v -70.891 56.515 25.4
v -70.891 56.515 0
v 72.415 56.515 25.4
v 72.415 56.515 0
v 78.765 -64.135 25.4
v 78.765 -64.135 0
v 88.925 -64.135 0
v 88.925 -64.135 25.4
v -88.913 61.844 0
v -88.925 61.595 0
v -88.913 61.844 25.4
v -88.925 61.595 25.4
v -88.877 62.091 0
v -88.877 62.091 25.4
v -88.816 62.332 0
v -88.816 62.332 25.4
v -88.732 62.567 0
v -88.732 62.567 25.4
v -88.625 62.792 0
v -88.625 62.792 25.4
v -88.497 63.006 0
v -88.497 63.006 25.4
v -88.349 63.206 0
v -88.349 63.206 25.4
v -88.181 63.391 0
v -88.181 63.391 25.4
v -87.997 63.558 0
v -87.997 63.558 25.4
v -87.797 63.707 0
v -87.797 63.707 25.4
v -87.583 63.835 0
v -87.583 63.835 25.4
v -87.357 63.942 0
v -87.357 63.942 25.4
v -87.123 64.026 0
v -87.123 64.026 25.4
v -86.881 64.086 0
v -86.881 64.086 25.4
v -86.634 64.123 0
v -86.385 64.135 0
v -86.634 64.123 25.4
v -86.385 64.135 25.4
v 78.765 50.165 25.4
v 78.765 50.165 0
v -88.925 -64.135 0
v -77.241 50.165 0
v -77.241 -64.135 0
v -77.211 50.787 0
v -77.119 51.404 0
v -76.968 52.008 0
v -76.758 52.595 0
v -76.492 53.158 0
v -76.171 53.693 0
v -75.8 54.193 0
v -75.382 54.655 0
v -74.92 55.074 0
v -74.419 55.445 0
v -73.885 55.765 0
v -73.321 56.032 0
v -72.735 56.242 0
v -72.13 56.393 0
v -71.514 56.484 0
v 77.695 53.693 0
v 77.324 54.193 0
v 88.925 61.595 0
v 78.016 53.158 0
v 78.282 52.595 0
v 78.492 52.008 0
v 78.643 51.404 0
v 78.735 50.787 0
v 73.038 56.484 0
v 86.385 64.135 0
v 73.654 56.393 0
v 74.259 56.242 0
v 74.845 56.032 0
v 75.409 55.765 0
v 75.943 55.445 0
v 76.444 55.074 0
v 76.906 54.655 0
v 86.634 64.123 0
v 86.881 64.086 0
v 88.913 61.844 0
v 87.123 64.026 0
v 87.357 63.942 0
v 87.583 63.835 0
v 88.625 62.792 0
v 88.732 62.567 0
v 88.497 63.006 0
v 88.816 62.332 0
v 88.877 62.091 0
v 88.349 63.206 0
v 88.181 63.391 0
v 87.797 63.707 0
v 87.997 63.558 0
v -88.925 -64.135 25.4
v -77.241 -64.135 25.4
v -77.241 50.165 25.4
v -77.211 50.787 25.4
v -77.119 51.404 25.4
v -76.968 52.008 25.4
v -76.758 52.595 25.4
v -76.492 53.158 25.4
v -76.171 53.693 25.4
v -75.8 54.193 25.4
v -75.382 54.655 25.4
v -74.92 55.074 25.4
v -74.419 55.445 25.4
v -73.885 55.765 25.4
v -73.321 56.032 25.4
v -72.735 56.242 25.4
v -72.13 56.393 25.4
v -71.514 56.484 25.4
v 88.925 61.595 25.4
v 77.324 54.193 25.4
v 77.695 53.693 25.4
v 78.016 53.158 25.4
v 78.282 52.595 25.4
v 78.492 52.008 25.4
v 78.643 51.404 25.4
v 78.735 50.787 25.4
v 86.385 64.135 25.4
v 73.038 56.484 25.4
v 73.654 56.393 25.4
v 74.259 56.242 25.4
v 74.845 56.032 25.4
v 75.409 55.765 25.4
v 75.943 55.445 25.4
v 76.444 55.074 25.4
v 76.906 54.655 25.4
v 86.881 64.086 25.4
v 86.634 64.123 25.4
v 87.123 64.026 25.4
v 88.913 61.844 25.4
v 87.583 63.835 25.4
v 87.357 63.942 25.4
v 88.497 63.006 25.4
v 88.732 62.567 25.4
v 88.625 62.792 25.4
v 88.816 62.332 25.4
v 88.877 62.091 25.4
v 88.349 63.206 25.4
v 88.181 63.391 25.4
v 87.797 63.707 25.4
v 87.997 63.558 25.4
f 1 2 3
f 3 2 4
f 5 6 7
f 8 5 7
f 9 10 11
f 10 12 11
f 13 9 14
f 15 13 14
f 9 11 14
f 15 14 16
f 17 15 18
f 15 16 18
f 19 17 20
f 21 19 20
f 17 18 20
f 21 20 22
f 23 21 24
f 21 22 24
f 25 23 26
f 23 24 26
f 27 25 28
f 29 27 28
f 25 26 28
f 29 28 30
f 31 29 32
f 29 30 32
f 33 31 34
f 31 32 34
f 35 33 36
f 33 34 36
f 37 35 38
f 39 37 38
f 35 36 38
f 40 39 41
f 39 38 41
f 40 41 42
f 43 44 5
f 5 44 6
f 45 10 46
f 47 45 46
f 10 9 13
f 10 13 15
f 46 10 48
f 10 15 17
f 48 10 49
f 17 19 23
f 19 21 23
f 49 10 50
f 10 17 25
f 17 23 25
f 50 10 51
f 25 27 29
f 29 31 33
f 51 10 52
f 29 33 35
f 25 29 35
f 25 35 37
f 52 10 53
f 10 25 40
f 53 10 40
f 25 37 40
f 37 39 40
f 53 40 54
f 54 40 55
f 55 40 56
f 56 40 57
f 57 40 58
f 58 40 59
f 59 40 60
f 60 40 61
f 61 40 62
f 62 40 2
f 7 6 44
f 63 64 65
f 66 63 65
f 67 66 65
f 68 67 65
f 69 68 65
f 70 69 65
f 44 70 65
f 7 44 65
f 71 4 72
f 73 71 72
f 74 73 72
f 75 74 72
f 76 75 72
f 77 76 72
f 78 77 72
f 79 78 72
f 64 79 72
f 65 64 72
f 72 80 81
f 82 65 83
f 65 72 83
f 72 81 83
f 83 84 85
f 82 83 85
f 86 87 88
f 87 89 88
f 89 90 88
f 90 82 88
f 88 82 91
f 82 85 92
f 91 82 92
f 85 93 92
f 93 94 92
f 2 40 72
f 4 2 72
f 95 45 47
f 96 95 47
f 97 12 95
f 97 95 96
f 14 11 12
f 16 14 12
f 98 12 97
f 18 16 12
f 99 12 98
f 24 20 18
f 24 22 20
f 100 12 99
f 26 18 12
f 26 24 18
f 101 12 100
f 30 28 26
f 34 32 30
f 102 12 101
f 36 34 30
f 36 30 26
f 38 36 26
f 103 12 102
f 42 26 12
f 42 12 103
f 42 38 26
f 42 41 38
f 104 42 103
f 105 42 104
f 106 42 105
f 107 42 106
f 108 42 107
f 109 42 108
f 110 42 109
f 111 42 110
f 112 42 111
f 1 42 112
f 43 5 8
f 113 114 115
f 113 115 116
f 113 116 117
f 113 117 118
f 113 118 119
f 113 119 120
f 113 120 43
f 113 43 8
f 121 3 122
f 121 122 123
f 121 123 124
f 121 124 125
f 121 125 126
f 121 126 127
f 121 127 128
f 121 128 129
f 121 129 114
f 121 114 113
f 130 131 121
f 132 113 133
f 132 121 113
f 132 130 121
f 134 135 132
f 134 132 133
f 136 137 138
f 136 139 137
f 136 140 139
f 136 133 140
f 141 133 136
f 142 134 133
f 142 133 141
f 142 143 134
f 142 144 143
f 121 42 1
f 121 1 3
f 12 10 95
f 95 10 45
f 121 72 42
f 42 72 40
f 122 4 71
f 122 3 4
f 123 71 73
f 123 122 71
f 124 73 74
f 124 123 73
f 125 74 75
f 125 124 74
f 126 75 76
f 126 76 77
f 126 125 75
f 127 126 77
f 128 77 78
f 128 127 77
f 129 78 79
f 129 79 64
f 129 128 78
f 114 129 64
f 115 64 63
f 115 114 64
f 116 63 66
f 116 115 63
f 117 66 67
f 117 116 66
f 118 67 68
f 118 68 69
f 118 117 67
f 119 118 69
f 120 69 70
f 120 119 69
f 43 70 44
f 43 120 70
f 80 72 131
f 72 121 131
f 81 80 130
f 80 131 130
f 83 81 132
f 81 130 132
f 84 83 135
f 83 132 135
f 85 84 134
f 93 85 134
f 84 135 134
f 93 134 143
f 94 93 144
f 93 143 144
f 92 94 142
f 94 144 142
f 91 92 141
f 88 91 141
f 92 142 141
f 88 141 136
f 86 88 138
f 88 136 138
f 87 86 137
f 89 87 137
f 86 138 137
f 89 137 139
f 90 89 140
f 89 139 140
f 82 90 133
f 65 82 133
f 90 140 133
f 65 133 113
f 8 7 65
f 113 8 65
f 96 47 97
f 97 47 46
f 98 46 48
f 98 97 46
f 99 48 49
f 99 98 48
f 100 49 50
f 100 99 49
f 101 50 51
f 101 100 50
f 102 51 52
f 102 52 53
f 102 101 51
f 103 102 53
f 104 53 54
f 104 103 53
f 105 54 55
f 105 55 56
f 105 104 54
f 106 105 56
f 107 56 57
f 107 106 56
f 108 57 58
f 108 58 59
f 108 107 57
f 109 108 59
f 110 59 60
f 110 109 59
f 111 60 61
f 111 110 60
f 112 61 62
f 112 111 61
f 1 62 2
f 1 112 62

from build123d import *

# Parameters (mm, degrees)
BOSS_EXTRUDE1_DEPTH = 25.4
FILLET1_R           = 6.35
FILLET2_R           = 2.54


with BuildPart() as part:
    # Sketch1 → Boss-Extrude1 (new body)
    with BuildSketch(Plane.XY):
        Polygon((78.7654, -64.135), (88.9254, -64.135), (88.9254, 64.135), (-88.9254, 64.135), (-88.9254, -64.135), (-77.2414, -64.135), (-77.2414, 56.515), (78.7654, 56.515), align=None)
    extrude(amount=BOSS_EXTRUDE1_DEPTH)

    # Fillet1
    fillet1_edges = [part.edges().sort_by_distance(p)[0] for p in [
        (78.7654, 56.515, 12.7),
        (-77.2414, 56.515, 12.7),
    ]]
    fillet(fillet1_edges, radius=FILLET1_R)

    # Fillet2
    fillet2_edges = [part.edges().sort_by_distance(p)[0] for p in [
        (-88.9254, 64.135, 12.7),
        (88.9254, 64.135, 12.7),
    ]]
    fillet(fillet2_edges, radius=FILLET2_R)


solid = part.part
